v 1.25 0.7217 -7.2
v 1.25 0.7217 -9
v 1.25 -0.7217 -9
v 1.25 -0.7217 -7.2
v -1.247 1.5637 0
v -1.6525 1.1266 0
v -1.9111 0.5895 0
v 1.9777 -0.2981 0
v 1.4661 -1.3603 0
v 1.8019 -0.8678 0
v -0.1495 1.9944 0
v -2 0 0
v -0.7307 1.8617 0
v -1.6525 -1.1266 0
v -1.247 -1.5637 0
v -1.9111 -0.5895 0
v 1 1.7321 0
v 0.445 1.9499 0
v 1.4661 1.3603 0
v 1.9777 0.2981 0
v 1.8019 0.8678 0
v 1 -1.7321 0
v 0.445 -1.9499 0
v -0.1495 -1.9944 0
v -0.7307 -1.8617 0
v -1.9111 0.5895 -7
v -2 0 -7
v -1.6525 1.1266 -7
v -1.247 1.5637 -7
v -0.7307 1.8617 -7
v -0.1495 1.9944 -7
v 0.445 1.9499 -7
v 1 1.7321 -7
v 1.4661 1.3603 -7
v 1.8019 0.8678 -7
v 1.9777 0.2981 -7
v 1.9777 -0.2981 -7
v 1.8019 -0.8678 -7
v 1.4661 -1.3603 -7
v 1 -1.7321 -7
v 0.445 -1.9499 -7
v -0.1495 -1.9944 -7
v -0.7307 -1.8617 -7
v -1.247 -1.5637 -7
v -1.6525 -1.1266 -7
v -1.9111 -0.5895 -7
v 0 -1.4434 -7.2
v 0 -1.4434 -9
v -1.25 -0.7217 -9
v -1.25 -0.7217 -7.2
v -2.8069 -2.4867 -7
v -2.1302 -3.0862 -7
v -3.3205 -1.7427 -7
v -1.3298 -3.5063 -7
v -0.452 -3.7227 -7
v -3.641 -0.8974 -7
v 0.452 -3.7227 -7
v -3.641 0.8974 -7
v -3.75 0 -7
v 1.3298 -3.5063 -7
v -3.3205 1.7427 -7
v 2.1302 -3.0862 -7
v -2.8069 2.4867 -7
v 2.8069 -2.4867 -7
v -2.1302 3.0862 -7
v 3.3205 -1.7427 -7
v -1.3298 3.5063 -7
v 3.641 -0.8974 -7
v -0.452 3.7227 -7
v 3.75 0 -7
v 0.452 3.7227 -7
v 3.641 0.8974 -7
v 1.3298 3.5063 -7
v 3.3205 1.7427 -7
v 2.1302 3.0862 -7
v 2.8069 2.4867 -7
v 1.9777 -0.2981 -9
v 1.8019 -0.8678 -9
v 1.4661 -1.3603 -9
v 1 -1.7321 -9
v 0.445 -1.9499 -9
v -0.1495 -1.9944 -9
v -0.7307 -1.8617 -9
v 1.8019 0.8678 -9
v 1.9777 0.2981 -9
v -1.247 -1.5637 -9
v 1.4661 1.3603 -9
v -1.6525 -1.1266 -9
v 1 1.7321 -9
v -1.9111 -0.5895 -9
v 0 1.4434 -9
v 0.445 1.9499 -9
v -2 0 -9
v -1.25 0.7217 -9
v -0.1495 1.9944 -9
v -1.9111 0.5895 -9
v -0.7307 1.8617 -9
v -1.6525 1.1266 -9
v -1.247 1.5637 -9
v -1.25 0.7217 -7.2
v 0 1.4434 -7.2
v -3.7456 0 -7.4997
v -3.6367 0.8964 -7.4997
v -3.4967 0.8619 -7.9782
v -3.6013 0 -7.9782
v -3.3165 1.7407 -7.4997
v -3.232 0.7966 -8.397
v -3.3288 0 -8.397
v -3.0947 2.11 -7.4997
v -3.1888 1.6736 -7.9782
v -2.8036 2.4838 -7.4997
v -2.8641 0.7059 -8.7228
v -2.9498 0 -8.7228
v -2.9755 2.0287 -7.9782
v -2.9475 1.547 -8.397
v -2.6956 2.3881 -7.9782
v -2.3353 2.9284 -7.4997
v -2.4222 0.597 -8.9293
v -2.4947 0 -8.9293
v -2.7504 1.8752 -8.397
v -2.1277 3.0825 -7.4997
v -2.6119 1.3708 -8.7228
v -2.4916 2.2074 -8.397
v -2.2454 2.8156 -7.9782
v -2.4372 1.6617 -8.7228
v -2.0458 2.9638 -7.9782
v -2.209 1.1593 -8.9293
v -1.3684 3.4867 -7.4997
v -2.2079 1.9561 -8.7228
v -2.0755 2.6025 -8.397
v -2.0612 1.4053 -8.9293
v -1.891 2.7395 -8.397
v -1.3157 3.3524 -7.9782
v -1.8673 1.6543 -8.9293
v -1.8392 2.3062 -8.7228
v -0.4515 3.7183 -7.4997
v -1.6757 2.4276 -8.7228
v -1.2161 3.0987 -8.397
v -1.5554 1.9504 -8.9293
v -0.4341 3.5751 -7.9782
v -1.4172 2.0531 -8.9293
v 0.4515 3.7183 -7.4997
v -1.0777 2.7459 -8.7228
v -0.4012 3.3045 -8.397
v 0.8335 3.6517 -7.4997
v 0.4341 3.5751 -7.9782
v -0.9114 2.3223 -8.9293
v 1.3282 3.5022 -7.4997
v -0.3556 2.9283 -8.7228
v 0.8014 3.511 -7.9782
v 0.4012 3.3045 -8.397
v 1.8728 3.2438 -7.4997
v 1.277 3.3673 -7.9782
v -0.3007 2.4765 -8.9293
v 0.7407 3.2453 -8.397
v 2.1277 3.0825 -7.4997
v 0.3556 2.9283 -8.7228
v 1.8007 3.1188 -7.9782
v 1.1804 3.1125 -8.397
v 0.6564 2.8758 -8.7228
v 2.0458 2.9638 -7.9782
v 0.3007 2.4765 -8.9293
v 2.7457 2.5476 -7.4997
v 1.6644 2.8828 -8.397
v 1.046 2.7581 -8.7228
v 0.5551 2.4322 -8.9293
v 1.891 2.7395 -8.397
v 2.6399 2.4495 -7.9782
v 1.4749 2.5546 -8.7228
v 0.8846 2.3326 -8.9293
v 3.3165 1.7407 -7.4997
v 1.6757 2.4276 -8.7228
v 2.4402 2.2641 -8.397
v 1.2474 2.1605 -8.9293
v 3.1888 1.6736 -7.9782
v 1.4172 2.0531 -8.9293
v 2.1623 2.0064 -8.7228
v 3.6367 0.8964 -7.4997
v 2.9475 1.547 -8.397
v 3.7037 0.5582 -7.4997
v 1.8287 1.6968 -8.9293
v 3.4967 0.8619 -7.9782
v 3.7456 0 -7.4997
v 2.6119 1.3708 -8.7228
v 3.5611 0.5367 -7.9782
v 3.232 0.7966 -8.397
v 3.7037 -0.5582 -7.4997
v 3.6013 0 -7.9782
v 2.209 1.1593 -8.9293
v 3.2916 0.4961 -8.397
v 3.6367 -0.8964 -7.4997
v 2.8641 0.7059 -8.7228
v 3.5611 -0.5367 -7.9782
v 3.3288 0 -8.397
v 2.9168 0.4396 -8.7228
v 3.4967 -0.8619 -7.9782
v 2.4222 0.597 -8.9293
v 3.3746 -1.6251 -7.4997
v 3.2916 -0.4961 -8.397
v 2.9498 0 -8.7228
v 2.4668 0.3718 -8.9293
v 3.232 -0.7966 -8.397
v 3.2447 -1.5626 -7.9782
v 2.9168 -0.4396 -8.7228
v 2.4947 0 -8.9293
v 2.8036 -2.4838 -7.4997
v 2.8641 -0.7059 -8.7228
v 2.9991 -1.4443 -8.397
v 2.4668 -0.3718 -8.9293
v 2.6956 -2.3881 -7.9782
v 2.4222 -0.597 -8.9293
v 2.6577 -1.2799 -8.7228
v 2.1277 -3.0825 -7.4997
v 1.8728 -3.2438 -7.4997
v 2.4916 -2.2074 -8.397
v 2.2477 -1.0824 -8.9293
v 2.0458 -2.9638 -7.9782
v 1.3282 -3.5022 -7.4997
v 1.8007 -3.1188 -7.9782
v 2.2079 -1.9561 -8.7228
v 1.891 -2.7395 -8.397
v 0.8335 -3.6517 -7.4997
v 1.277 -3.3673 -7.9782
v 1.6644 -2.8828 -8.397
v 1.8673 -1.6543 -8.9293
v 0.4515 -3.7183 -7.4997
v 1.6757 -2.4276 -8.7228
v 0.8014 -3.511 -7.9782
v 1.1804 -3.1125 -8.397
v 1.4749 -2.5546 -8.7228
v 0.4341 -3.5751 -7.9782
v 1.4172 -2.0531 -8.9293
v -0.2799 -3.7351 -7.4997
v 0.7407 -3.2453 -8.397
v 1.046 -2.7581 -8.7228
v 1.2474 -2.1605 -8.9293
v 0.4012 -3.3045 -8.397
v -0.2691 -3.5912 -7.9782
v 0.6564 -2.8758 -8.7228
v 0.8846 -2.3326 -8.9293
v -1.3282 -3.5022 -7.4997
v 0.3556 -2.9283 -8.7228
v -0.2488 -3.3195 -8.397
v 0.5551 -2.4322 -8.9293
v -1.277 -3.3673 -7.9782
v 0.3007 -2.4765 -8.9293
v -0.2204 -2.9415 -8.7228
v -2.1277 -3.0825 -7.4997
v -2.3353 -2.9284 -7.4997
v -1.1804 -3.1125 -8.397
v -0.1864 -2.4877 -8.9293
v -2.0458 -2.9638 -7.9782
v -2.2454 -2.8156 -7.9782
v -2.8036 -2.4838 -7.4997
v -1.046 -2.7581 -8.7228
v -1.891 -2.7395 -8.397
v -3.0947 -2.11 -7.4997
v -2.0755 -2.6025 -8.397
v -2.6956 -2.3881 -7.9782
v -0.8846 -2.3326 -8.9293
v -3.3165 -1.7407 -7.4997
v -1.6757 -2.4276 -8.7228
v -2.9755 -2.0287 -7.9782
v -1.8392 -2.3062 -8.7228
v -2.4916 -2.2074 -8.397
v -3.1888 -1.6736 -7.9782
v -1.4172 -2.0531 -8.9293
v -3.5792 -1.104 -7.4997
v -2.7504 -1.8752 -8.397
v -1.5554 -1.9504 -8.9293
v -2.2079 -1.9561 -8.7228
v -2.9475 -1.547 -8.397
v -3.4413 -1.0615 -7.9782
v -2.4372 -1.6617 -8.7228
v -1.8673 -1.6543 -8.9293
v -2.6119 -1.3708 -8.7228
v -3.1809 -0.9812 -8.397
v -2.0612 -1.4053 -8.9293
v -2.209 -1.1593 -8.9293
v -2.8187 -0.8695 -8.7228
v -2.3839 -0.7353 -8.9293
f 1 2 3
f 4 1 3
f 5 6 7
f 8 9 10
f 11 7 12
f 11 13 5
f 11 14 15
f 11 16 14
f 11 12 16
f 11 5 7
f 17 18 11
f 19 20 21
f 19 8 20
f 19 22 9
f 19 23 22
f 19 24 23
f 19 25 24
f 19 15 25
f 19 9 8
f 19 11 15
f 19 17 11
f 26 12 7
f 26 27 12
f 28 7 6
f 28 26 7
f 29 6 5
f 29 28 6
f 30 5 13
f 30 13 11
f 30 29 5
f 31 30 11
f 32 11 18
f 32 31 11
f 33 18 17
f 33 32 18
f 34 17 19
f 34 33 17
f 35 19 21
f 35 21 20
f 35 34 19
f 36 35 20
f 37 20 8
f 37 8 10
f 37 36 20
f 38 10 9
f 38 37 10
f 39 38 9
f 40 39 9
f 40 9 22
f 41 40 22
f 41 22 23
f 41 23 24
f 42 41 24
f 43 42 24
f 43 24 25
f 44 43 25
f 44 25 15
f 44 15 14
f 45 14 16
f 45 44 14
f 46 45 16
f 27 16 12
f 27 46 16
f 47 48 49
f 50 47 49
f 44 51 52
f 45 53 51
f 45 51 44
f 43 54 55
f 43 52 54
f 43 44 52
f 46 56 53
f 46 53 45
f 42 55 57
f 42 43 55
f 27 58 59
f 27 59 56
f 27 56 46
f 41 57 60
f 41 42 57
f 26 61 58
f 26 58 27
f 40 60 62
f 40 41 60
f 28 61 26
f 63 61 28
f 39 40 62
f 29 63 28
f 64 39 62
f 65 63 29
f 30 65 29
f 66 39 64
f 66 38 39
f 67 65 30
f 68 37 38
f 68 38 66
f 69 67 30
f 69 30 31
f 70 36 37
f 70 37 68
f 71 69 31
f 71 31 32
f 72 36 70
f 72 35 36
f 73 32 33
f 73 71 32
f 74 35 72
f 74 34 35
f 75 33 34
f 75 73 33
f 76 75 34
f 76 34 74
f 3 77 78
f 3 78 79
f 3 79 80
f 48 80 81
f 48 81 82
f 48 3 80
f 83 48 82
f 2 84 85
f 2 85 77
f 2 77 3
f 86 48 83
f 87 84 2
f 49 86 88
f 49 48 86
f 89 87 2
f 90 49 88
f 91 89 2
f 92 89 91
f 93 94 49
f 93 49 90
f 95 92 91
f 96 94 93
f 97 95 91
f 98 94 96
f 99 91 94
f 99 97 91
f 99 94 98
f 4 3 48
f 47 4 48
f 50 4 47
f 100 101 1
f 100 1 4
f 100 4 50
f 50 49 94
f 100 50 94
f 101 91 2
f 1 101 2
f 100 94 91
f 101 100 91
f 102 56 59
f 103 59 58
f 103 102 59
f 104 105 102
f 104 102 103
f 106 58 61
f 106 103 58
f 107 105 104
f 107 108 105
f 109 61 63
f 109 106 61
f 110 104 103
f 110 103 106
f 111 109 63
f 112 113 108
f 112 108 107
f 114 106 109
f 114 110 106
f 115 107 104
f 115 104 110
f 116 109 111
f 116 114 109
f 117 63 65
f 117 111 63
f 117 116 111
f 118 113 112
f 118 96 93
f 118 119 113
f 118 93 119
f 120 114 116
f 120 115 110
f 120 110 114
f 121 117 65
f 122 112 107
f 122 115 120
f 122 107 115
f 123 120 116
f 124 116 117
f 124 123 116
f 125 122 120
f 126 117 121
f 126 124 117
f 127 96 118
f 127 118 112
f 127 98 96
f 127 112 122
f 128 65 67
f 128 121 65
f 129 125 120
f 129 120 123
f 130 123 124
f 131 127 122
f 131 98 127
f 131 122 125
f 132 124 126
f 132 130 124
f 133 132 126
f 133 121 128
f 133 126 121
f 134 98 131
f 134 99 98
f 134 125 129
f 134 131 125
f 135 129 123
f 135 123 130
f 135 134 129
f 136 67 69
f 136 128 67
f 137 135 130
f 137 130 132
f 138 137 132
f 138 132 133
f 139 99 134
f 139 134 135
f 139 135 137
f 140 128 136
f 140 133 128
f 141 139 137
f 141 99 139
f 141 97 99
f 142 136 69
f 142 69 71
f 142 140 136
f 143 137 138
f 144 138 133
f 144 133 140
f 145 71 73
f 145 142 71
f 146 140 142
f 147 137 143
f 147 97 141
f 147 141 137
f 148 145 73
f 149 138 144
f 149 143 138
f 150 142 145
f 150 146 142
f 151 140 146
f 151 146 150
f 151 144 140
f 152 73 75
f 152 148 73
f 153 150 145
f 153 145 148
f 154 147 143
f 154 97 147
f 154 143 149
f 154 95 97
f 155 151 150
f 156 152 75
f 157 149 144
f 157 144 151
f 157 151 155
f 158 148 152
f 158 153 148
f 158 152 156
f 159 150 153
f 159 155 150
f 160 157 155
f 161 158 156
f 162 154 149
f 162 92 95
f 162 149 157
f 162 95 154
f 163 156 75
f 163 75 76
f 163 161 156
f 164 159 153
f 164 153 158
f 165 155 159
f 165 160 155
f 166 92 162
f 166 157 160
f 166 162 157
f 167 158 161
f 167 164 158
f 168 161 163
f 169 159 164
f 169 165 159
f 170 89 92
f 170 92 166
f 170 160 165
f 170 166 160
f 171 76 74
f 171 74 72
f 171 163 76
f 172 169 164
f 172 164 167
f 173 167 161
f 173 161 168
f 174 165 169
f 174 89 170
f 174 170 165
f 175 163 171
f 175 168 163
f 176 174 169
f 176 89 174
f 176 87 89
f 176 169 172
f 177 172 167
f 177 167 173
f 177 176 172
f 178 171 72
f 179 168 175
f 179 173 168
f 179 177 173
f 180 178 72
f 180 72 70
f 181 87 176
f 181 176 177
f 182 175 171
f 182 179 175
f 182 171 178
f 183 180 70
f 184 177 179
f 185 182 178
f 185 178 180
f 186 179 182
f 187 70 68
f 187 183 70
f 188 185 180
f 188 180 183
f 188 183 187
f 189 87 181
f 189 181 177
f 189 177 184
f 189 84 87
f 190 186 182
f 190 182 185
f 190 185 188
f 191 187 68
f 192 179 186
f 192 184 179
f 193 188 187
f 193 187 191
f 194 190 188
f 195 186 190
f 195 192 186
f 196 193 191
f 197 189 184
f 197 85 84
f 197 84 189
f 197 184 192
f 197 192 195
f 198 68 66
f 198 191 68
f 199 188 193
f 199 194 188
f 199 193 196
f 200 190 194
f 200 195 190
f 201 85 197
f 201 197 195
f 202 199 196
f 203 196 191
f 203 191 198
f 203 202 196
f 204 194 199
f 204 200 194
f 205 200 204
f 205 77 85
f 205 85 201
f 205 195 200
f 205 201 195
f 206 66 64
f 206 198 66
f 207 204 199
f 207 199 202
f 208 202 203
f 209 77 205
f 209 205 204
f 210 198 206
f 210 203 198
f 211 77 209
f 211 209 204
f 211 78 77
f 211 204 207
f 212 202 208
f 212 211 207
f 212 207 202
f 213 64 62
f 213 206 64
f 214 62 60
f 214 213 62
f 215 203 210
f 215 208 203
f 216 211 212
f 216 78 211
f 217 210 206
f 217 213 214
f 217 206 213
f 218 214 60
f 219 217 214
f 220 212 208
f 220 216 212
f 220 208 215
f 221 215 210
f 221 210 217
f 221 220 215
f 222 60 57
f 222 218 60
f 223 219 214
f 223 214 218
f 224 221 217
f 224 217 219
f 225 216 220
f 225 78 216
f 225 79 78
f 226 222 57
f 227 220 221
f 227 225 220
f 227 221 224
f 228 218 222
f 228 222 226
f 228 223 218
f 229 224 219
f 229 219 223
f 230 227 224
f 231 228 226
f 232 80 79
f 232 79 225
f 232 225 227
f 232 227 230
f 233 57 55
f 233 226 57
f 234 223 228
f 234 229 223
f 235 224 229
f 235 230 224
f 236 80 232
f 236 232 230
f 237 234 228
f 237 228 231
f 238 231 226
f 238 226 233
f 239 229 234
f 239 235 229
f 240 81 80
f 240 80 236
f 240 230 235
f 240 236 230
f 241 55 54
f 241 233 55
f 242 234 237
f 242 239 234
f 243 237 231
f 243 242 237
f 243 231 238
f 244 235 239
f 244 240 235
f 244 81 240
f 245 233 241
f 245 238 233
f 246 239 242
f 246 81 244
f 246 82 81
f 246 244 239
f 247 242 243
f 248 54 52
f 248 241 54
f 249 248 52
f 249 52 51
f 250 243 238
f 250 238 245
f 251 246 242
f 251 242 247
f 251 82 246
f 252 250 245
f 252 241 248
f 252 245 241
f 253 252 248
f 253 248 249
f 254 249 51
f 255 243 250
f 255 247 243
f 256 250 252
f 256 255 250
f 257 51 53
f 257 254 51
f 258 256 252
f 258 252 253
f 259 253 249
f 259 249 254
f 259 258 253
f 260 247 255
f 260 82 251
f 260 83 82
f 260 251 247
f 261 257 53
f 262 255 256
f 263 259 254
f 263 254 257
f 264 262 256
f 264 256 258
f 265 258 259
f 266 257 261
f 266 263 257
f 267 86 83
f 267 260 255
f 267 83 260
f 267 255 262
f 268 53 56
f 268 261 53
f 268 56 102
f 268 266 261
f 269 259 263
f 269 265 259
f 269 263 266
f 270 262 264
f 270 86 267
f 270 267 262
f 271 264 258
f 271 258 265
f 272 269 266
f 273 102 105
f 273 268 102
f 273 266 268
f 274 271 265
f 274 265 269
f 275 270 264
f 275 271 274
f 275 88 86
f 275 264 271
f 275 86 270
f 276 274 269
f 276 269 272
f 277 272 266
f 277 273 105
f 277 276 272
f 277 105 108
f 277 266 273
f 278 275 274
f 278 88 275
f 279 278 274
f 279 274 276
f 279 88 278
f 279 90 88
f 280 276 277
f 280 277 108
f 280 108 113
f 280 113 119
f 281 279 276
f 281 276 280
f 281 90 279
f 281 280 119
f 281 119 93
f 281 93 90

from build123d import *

# Parameters (mm, degrees)
CUT_EXTRUDE1_DEPTH = 1.8


with BuildPart() as part:
    # Sketch1 → Revolve1 (revolve)
    with BuildSketch(Plane(origin=(0, 0, 0), x_dir=(1, 0, 0), z_dir=(0, 1, 0))):
        with BuildLine():
            Line((0, 0), (-2, 0))
            Line((-2, 0), (-2, 7))
            Line((-2, 7), (-3.75, 7))
            ThreePointArc((-3.75, 7), (-3.328768227, 8.397047198), (-2, 9))
            Line((-2, 9), (0, 9))
            Line((0, 9), (0, 0))
        make_face()
    revolve(axis=Axis((0, 0, 0), (0, 0, -1)))

    # Sketch2 → Cut-Extrude1 (cut)
    with BuildSketch(Plane(origin=(0, 0, -9), x_dir=(-1, 0, 0), z_dir=(0, 0, -1))):
        Polygon((0, -1.443375673), (1.25, -0.721687836), (1.25, 0.721687836), (0, 1.443375673), (-1.25, 0.721687836), (-1.25, -0.721687836), align=None)
    extrude(amount=-CUT_EXTRUDE1_DEPTH, mode=Mode.SUBTRACT)


solid = part.part
